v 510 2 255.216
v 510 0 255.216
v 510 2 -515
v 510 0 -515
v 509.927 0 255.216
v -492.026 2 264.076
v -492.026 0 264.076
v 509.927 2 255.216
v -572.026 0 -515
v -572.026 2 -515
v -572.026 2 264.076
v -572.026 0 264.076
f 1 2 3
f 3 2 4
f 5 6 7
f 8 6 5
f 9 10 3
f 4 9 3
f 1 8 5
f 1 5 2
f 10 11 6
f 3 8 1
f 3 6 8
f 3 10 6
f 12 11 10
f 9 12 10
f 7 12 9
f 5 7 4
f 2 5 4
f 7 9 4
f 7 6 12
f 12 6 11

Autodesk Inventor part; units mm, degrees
ref_plane "YZ Plane" through (0, 0, 0) normal (1, 0, 0) x (0, 1, 0)
ref_plane "XZ Plane" through (0, 0, 0) normal (0, 1, 0) x (-1, 0, 0)
ref_plane "XY Plane" through (0, 0, 0) normal (0, 0, 1) x (1, 0, 0)
sketch "Sketch1" plane through (0, 0, 0) normal (0, 1, 0) x (-1, 0, 0)
  line L0 (510, 515) -> (-510, 515)
  line L1 (-510, 515) -> (-510, -515)
  line L2 (-510, -515) -> (510, -515)
  line L3 (510, -515) -> (510, 515)
  line L4 (510, 515) -> (-510, -515) construction
  line L5 (-510, 515) -> (510, -515) construction
  point P0 (0, 0)
  dimension "d0" = 1020
  dimension "d1" = 1030
extrude "Plate1" add sketch "Sketch1" along normal blind 2
sketch "Sketch2" plane through (0, 0, 0) normal (0, -1, 0) x (1, 0, 0)
  line L0 (-492.0259, 515) -> (-492.0259, -515) projected
  line L1 (510, 515) -> (510, -515) projected
  line L2 (-510, 515) -> (510, 515) projected
  line L3 (-510, -515) -> (-510, 515) projected
  line L4 (510, -515) -> (-510, -515) projected
  point P0 (0, 0)
extrude "Extrusion1" cut sketch "Sketch2" against normal through all contours L0 L4 L3 L2
sketch "Sketch3" plane through (0, 2, 0) normal (0, 1, 0) x (1, 0, 0)
  line L0 (509.927, -255.216) -> (502.87, -255.6841) projected
  line L1 (-555.9699, -264.6411) -> (509.927, -255.216) projected
  line L2 (-492.0259, 515) -> (-492.0259, -515) projected
  line L3 (510, -515) -> (-492.0259, -515) projected
  line L4 (510, 515) -> (510, -515) projected
  line L5 (-492.0259, 515) -> (510, 515) projected
  line L6 (509.927, -255.216) -> (510, -255.216)
  point P0 (0, 0)
  point P1 (-492.0259, -264.0757)
extrude "Extrusion2" cut sketch "Sketch3" against normal through all contours L1 L6 L4 L3 L2
sketch "Sketch4" plane through (0, 2, 0) normal (0, 1, 0) x (1, 0, 0)
  line L0 (-492.0259, -264.0757) -> (-492.0259, 515) projected
  line L1 (-492.0259, -264.0757) -> (-572.0259, -264.0757)
  line L2 (-572.0259, -264.0757) -> (-572.0259, 515)
  line L3 (-572.0259, 515) -> (-492.0259, 515)
  line L4 (-492.0259, 515) -> (-492.0259, -264.0757)
  point P0 (0, 0)
  point P1 (-532.0259, 515)
  point P2 (-492.0259, 515)
  dimension "d7" = 80
  dimension "d8" = 740.457
extrude "Extrusion3" add sketch "Sketch4" against normal blind 2
equation "\"d2\" = Thickness"
equation "\"BendRadius\" = Thickness"
equation "\"BendReliefWidth\" = Thickness"
equation "\"BendReliefDepth\" = 0.5 * Thickness"
equation "\"CornerReliefSize\" = 4 * Thickness"
equation "\"MinimumRemnant\" = 2 * Thickness"
equation "\"TransitionRadius\" = BendRadius"
equation "\"JacobiRadiusSize\" = BendRadius"
equation "\"GapSize\" = Thickness"
equation "\"Thickness\" = 2"
properties part number "inclind sheet2"
